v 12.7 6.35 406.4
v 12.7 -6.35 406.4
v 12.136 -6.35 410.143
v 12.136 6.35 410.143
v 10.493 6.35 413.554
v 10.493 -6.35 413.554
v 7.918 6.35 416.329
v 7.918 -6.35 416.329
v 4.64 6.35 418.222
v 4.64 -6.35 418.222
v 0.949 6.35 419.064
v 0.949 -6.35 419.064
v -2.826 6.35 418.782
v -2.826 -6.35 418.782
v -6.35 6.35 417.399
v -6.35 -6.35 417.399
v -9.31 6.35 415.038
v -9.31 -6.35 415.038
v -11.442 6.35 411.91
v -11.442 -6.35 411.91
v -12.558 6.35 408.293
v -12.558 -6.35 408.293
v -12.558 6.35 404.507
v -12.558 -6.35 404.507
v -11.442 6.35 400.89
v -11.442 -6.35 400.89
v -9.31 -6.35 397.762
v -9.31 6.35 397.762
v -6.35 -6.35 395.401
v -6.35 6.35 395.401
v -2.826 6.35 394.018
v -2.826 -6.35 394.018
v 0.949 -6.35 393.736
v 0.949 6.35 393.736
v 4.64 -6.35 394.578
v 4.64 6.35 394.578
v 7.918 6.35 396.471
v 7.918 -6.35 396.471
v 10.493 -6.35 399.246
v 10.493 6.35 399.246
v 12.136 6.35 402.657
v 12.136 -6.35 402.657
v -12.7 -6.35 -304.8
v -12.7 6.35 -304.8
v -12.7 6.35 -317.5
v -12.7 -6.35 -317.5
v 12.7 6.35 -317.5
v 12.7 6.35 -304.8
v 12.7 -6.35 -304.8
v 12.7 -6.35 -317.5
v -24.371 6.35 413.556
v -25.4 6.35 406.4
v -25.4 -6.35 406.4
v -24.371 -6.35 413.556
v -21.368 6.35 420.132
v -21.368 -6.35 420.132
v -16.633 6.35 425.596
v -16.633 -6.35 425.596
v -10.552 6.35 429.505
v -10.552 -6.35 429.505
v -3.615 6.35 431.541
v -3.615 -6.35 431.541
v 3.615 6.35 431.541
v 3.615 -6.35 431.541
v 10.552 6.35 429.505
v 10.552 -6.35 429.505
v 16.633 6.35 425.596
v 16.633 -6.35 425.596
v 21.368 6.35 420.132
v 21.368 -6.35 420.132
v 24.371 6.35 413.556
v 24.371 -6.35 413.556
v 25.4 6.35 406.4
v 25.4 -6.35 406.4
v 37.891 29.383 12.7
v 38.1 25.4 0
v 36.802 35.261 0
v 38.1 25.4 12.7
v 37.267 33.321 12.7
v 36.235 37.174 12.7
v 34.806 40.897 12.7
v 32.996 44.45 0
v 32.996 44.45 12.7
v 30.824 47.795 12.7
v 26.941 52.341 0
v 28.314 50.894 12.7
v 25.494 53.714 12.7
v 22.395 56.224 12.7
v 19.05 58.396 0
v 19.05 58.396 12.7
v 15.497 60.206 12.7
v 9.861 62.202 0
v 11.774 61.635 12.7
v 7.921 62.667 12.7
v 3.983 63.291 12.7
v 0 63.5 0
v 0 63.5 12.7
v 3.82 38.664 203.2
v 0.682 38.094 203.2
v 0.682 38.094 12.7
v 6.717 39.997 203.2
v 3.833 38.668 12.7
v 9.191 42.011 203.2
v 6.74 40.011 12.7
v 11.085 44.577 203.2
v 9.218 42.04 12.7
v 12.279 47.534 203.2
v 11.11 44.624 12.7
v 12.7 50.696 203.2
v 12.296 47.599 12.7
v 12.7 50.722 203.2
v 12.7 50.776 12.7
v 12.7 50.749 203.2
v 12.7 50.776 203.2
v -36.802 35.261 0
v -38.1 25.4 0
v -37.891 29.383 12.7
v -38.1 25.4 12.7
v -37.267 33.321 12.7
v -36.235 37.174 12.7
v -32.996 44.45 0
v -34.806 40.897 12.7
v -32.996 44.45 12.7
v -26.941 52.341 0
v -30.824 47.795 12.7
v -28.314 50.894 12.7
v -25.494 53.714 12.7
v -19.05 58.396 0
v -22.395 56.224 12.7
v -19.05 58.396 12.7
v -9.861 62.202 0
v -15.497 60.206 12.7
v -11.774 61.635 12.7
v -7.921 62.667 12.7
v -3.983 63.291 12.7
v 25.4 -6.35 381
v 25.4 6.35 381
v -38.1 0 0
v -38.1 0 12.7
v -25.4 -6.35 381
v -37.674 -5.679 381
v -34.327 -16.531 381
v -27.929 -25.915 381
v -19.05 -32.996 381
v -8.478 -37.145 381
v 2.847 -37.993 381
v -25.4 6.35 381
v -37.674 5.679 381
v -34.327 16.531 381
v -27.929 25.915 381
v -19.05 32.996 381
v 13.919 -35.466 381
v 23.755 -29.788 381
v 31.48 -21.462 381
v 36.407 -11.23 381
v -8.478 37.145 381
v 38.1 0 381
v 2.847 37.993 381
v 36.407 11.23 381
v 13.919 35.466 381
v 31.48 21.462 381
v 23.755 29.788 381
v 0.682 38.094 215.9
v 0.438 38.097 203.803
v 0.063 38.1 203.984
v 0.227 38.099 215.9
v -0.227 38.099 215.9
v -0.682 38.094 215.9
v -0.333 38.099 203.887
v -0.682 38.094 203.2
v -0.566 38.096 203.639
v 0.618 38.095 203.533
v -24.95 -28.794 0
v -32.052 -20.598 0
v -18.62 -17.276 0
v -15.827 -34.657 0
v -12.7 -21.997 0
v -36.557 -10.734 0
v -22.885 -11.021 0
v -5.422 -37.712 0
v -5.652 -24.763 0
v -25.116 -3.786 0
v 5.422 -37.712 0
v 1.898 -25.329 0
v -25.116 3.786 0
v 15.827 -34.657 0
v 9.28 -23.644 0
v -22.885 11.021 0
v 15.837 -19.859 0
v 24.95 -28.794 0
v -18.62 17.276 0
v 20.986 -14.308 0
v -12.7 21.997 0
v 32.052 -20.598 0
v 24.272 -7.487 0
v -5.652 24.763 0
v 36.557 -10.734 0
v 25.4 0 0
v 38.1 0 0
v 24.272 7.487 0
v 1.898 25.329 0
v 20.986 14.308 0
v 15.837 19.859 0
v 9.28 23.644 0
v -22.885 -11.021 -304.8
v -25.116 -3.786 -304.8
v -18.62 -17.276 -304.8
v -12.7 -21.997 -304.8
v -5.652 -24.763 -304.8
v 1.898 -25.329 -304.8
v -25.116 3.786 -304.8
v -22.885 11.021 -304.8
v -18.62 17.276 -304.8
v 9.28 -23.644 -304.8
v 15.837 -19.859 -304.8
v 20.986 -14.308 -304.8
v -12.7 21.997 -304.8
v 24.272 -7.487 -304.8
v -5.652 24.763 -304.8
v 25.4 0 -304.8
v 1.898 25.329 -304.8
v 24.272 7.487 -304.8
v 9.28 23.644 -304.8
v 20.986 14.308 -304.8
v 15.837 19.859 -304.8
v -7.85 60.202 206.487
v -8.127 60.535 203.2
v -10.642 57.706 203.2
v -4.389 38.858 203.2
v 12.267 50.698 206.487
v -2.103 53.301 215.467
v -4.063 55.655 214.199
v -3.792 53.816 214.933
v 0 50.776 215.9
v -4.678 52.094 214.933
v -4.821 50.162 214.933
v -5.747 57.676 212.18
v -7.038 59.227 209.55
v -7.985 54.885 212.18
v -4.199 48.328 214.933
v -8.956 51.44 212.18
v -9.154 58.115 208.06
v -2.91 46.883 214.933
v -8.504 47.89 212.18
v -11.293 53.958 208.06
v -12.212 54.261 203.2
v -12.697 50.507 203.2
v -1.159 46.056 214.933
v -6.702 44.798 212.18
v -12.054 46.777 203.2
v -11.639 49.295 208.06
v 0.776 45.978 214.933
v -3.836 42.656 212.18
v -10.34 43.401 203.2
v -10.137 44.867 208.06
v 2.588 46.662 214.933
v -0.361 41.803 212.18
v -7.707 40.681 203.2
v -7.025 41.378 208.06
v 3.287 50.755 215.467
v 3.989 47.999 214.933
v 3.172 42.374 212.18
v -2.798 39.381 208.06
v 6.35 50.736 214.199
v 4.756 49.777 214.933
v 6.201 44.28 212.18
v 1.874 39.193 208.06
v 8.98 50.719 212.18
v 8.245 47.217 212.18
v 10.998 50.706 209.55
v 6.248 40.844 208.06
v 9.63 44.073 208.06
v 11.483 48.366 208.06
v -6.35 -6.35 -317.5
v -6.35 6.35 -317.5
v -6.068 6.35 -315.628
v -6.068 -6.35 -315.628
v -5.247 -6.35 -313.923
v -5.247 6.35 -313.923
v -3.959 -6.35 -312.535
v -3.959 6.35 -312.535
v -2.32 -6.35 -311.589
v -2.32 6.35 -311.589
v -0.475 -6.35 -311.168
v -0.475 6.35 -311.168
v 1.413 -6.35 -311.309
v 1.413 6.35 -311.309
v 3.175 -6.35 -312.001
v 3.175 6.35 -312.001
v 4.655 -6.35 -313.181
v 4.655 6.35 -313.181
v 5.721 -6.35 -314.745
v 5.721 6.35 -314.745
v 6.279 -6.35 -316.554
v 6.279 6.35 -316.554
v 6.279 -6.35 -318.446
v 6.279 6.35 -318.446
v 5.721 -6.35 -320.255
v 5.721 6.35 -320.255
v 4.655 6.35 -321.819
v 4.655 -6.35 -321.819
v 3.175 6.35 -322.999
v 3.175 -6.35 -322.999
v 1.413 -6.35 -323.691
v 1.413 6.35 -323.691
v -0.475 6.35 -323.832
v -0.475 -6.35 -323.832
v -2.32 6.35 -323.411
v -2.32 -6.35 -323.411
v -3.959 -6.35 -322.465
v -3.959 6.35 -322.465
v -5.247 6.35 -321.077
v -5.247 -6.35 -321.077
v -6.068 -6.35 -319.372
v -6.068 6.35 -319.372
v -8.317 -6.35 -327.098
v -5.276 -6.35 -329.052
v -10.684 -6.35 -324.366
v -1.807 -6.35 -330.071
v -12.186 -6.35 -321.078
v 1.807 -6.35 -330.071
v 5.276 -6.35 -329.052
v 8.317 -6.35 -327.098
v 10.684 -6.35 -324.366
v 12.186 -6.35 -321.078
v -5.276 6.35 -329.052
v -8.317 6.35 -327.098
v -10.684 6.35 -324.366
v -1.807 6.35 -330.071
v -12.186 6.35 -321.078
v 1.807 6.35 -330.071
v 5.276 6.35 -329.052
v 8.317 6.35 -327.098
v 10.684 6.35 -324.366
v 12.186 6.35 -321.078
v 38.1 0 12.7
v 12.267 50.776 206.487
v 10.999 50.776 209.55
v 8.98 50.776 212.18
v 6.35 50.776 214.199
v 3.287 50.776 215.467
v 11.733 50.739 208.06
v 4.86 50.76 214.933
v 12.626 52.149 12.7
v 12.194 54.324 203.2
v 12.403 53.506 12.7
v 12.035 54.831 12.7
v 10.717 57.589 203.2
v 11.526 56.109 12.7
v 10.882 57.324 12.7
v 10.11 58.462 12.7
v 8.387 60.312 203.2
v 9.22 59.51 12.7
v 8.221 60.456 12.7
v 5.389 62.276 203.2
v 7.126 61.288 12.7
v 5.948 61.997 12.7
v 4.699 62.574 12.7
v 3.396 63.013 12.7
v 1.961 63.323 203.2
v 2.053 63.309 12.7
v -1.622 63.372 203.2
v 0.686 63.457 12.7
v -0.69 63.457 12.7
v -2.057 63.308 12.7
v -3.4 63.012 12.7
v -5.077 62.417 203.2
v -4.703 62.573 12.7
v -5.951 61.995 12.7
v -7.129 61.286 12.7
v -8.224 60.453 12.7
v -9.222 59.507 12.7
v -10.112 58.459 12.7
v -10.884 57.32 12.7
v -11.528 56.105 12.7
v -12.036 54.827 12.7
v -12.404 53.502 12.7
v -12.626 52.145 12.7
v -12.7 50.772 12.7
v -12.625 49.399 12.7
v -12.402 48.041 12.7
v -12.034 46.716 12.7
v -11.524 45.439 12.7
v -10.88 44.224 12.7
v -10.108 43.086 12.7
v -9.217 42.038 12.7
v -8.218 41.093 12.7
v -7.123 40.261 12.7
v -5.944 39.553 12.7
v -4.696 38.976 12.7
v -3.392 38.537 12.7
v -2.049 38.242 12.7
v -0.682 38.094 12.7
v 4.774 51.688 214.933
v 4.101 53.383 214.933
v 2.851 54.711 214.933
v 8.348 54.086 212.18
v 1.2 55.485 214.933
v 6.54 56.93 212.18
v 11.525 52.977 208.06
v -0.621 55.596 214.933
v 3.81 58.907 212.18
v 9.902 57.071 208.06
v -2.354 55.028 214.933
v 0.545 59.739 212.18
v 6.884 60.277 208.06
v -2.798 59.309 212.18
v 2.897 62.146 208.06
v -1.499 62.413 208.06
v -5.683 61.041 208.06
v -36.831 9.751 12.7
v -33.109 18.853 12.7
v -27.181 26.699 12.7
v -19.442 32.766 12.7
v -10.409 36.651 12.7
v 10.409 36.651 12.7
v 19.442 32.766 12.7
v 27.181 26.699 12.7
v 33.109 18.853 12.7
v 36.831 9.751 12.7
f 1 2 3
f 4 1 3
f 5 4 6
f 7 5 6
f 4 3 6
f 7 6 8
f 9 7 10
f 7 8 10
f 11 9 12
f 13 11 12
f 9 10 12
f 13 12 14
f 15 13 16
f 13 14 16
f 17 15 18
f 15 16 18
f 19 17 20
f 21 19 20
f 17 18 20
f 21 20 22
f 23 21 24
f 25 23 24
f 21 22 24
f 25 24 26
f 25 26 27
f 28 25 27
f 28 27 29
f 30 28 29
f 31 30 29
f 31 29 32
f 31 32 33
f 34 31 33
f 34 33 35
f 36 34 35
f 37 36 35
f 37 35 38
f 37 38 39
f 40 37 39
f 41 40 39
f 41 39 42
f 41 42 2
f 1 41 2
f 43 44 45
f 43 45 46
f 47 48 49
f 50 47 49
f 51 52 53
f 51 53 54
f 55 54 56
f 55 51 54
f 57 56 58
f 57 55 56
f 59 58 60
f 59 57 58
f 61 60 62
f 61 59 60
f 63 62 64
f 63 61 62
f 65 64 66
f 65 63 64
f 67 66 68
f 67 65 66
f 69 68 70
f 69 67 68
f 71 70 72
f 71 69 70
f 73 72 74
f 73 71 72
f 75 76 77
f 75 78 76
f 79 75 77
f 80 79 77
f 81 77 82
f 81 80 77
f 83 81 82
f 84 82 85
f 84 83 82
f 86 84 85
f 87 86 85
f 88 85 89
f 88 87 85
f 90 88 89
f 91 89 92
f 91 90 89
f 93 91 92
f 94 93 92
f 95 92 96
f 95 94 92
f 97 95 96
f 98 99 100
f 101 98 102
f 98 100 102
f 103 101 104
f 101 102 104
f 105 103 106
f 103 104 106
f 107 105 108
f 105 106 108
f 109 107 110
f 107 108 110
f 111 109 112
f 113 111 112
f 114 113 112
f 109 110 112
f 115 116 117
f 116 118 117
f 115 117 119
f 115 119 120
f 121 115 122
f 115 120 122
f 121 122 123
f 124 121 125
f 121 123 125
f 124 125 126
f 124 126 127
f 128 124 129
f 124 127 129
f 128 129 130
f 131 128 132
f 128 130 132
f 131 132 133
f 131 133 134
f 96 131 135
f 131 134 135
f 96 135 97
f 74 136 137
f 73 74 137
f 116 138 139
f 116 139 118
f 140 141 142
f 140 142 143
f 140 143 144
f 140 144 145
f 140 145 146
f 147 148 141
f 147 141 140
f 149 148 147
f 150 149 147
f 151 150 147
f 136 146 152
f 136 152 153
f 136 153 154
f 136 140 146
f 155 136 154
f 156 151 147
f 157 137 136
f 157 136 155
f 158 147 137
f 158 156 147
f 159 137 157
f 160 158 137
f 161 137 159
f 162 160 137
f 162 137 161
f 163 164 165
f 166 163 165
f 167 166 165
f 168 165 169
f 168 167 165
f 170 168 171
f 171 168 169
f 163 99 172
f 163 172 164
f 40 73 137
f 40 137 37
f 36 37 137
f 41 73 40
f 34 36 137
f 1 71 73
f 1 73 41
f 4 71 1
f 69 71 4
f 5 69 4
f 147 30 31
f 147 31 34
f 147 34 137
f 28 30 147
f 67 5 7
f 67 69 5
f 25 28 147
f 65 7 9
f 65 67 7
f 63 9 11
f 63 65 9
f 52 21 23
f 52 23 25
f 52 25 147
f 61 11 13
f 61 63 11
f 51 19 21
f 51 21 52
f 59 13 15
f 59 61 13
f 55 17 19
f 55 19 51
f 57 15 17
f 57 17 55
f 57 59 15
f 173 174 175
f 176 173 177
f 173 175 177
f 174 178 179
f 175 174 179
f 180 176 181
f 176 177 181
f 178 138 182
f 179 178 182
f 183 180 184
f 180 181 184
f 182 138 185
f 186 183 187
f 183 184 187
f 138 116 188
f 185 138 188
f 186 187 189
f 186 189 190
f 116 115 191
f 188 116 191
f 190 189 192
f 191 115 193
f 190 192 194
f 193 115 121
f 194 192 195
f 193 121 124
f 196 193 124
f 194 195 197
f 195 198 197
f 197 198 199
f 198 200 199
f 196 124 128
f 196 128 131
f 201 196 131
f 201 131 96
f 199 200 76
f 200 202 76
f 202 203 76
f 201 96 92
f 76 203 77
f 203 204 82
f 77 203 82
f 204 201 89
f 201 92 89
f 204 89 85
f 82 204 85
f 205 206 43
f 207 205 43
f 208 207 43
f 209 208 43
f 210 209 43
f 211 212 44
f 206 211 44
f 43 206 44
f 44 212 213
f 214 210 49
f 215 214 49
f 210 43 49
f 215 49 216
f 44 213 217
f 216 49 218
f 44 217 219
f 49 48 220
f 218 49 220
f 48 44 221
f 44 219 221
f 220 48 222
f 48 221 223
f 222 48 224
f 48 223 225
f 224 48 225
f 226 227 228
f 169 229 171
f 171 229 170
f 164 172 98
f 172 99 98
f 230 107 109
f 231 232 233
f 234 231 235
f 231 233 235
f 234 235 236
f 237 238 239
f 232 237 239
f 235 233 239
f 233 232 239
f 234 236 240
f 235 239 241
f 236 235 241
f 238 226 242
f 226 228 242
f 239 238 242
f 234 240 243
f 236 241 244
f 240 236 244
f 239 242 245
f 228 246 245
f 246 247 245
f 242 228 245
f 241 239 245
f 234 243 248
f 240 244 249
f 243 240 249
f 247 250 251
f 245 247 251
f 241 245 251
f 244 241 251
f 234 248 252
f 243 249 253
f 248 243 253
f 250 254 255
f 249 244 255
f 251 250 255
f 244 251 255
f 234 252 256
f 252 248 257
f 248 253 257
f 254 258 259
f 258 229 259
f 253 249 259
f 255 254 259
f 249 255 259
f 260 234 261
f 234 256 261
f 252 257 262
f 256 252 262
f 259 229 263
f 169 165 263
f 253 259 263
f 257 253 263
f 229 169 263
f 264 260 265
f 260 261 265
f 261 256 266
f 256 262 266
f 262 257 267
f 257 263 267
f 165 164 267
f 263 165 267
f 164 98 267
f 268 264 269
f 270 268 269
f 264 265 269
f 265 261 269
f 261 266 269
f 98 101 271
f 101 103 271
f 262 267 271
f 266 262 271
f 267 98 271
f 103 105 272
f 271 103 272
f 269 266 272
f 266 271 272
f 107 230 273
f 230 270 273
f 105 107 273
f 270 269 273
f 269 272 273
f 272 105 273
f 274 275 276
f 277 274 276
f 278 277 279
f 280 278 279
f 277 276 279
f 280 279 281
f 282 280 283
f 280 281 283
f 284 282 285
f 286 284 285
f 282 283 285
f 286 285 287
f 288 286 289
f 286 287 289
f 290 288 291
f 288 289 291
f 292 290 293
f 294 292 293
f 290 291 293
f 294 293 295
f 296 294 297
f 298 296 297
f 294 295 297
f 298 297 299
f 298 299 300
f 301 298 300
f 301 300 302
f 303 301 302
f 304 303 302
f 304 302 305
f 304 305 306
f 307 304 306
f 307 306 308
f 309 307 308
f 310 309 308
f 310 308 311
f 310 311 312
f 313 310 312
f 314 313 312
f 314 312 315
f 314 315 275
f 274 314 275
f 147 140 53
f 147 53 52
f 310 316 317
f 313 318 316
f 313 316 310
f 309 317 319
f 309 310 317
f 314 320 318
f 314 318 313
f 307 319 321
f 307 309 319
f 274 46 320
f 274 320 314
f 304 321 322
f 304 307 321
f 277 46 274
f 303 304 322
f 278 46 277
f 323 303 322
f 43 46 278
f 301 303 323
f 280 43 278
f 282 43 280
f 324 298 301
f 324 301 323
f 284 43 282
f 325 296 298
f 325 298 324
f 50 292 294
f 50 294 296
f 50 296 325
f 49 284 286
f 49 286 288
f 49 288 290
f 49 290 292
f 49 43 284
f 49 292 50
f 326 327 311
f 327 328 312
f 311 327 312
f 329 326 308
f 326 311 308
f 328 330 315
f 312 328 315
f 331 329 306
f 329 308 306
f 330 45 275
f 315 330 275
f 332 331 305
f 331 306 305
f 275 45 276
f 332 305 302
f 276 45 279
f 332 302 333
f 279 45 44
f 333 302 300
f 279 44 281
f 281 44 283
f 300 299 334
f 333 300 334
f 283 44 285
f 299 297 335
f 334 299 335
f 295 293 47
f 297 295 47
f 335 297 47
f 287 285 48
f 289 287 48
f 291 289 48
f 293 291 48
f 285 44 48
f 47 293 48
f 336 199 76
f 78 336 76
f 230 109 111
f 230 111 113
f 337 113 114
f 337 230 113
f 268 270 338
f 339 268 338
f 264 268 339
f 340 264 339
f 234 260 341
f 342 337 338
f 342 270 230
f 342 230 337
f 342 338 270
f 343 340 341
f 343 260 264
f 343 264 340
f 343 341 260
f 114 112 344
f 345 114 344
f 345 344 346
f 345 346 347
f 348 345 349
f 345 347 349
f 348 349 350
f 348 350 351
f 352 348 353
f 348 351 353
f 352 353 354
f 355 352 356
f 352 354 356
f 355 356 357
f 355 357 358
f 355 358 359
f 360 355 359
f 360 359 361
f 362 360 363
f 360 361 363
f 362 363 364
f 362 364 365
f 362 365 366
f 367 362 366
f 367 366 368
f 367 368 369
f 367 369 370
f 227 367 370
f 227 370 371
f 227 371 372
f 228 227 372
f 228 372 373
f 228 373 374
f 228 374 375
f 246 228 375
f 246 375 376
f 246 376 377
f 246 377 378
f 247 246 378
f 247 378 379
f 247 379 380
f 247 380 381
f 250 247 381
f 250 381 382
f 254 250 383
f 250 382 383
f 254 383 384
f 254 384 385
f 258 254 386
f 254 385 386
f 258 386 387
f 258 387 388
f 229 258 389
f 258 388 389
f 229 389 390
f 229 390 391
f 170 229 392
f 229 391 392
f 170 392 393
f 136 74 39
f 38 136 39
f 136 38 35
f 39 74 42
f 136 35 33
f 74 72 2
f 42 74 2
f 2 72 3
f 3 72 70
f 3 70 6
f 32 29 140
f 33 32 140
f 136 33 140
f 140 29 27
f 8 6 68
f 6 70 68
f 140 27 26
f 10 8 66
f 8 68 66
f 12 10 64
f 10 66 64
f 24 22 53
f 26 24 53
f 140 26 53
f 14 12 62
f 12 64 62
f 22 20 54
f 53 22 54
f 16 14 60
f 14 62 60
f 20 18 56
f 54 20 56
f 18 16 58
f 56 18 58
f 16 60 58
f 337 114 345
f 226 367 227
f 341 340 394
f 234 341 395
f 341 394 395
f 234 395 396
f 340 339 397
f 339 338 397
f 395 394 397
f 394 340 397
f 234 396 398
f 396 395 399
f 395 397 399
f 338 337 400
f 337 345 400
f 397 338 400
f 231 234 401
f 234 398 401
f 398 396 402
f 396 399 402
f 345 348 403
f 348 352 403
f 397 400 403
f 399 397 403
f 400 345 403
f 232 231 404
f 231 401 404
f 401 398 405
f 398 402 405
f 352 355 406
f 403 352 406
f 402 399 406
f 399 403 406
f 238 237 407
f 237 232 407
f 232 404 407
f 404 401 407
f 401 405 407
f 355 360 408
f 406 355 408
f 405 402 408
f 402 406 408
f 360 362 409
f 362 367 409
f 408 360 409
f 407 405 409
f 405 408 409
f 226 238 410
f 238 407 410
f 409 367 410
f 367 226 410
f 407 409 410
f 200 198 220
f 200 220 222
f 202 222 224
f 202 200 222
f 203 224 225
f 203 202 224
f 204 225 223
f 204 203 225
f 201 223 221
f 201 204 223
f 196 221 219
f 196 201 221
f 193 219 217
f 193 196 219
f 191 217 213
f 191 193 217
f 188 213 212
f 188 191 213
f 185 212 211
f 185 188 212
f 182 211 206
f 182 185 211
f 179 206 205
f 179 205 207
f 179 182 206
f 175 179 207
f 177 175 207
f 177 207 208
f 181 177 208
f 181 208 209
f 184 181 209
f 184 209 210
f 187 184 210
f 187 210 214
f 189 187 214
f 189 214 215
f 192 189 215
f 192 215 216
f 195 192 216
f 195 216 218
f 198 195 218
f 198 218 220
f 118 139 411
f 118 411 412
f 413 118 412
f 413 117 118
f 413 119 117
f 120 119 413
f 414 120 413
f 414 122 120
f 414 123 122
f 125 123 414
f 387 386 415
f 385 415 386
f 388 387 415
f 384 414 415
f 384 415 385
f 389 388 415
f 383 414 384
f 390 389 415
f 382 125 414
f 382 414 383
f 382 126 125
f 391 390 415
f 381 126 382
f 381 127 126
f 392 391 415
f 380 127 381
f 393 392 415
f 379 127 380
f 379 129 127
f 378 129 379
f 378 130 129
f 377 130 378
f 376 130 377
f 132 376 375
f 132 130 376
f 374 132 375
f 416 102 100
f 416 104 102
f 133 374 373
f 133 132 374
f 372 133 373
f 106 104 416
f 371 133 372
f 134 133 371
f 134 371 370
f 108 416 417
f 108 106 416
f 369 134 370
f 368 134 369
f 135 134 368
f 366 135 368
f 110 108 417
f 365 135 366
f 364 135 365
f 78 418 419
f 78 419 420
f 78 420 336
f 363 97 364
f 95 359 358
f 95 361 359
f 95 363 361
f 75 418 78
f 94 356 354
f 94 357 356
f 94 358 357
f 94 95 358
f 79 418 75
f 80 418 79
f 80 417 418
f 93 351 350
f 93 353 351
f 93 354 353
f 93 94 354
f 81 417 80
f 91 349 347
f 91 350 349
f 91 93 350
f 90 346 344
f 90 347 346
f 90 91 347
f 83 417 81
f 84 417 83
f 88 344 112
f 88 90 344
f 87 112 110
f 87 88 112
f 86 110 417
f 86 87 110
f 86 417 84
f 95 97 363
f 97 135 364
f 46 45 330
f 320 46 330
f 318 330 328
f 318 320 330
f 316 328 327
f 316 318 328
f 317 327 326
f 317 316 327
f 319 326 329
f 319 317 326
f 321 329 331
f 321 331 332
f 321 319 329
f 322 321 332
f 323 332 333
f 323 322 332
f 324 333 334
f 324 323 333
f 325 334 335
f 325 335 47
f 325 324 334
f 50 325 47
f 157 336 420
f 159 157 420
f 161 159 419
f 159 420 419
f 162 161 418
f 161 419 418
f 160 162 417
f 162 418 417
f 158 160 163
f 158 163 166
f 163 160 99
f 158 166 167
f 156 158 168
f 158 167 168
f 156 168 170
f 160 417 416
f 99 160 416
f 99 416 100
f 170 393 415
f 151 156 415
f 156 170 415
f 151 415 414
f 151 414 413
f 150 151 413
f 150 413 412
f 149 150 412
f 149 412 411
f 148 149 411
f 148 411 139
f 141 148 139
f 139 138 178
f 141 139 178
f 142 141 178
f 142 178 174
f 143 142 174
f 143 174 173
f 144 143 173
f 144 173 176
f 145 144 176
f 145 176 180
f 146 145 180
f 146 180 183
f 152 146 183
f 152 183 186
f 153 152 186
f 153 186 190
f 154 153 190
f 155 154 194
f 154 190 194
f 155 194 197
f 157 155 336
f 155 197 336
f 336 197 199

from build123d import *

# Parameters (mm, degrees)
F0_R         = 38.1
F1_DEPTH     = 381
F2_R         = 25.4
F3_DEPTH     = 304.8
F4_W         = 38.1
F4_H         = 63.5
F5_DEPTH     = 12.7
F7_DEPTH     = 203.2
F8_R         = 38.09999
F9_T3_ANGLE  = 359.64
F9_S4_R      = 38.1
F9_T5_DEPTH  = 21
F9_T8_ANGLE  = 230.2151920397
F9_S9_R      = 38.1
F9_T10_DEPTH = 20
F10_W        = 50.8
F10_H        = 12.7
F11_DEPTH    = 25.4
F13_DEPTH    = 12.7
F15_D        = 25.4
F16_W        = 25.4
F16_H        = 12.7
F17_DEPTH    = 12.7
F19_DEPTH    = 12.7
F21_D        = 12.7


# Not quite as in the source:
# - a fillet or chamfer that OpenCascade refuses, or shapes differently, is made with other operations: its cross-section is extruded or revolved along the edge and cut away or added
# - a fillet or chamfer is up to 0.001 mm smaller than in the source, because OpenCascade refuses the exact size


with BuildPart() as f1:
    # F0 (on Top) → F1 (new body)
    with BuildSketch(Plane.XY):
        Circle(F0_R)
    extrude(amount=F1_DEPTH)

    # F2 (on Top) → F3 (join)
    with BuildSketch(Plane.XY):
        Circle(F2_R)
    extrude(amount=-F3_DEPTH)

    # F4 (on Top) → F5 (join)
    with BuildSketch(Plane.XY):
        with Locations((19.05, 31.75)):
            Rectangle(F4_W, F4_H)
        with Locations((-19.05, 31.75)):
            Rectangle(F4_W, F4_H)
    extrude(amount=F5_DEPTH)

    # F6 (on face) → F7 (join)
    with BuildSketch(Plane.XY.offset(12.7)):
        with BuildLine():
            ThreePointArc((0.6819155813, 38.0938970327), (9.2181974345, 42.0397400715), (12.7, 50.7755763829))
            ThreePointArc((12.7, 50.7755763829), (-8.7358363114, 59.9937738174), (-0.6819155813, 38.0938970327))
            ThreePointArc((-0.6819155813, 38.0938970327), (0, 38.1), (0.6819155813, 38.0938970327))
        make_face()
        with BuildLine():
            ThreePointArc((0.6819155813, 38.0938970327), (0, 38.1), (-0.6819155813, 38.0938970327))
            ThreePointArc((-0.6819155813, 38.0938970327), (0, 38.0755763829), (0.6819155813, 38.0938970327))
        make_face()
    extrude(amount=F7_DEPTH)

    # F8 (radius 38.1 in the source; OpenCascade refuses exactly that, so slightly less here)
    f8_edges = [f1.edges().sort_by_distance(p)[0] for p in [
        (-38.1, 63.5, 6.35),
        (38.1, 63.5, 6.35),
    ]]
    fillet(f8_edges, radius=F8_R)

    # F9: fillet of radius 12.7 on 2 edges, made by hand


with BuildPart() as f9_tool1:
    # F9_s2 → F9_t3 (revolve)
    with BuildSketch(Plane.XZ.offset(-50.7755763829)):
        with BuildLine():
            ThreePointArc((0, 215.9), (8.9802561211, 212.1802561211), (12.7, 203.2))
            Line((12.7, 203.2), (12.7, 215.9))
            Line((12.7, 215.9), (0, 215.9))
        make_face()
    revolve(axis=Axis((0, 50.7755763829, 215.9), (0, 0, 1)), revolution_arc=F9_T3_ANGLE)

    # F9_s4 → F9_t5 (cut, symmetric)
    with BuildSketch(Plane.XY.offset(209.5)):
        Circle(F9_S4_R)
    extrude(amount=F9_T5_DEPTH, both=True, mode=Mode.SUBTRACT)


with BuildPart() as f9_tool6:
    # F9_s7 → F9_t8 (revolve)
    with BuildSketch(Plane(origin=(24.9682702957, 20.7915649924, 0), x_dir=(0, 0, 1), z_dir=(0.7684532224, 0.6399059658, 0))):
        with BuildLine():
            ThreePointArc((203.2, -51.7186552898), (212.1802561211, -47.9989114109), (215.9, -39.0186552898))
            Line((215.9, -39.0186552898), (215.9, -51.7186552898))
            Line((215.9, -51.7186552898), (203.2, -51.7186552898))
        make_face()
    revolve(axis=Axis((0, 50.7755763829, 215.9), (0, 0, 1)), revolution_arc=F9_T8_ANGLE)

    # F9_s9 → F9_t10 (cut, symmetric)
    with BuildSketch(Plane.XY.offset(209.5)):
        Circle(F9_S9_R)
    extrude(amount=F9_T10_DEPTH, both=True, mode=Mode.SUBTRACT)


with BuildPart() as f1_1:
    add(f1.part)

    # F9_t11: cut F9_tool1, F9_tool6
    add([f9_tool1.part, f9_tool6.part], mode=Mode.SUBTRACT)

    # F10 (on face) → F11 (join)
    with BuildSketch(Plane.XY.offset(381)):
        Rectangle(F10_W, F10_H)
    extrude(amount=F11_DEPTH)

    # F12 (on face) → F13 (join)
    with BuildSketch(Plane(origin=(0, 6.35, 0), x_dir=(-1, 0, 0), z_dir=(0, 1, 0))):
        with BuildLine():
            Line((-25.4, 406.4), (25.4, 406.4))
            ThreePointArc((25.4, 406.4), (0, 431.8), (-25.4, 406.4))
        make_face()
    extrude(amount=-F13_DEPTH)

    # F15 (through all)
    with Locations(Plane(origin=(0, 6.35, 0), x_dir=(-1, 0, 0), z_dir=(0, 1, 0))):
        with Locations((0, 406.4)):
            Hole(F15_D / 2)

    # F16 (on face) → F17 (join)
    with BuildSketch(Plane(origin=(0, 0, -304.8), x_dir=(1, 0, 0), z_dir=(0, 0, -1))):
        Rectangle(F16_W, F16_H)
    extrude(amount=F17_DEPTH)

    # F18 (on face) → F19 (join)
    with BuildSketch(Plane.XZ.offset(6.35)):
        with BuildLine():
            Line((12.7, -317.5), (-12.7, -317.5))
            ThreePointArc((-12.7, -317.5), (0, -330.2), (12.7, -317.5))
        make_face()
    extrude(amount=-F19_DEPTH)

    # F21 (through all)
    with Locations(Plane.XZ.offset(6.35)):
        with Locations((0, -317.5)):
            Hole(F21_D / 2)


solid = f1_1.part
